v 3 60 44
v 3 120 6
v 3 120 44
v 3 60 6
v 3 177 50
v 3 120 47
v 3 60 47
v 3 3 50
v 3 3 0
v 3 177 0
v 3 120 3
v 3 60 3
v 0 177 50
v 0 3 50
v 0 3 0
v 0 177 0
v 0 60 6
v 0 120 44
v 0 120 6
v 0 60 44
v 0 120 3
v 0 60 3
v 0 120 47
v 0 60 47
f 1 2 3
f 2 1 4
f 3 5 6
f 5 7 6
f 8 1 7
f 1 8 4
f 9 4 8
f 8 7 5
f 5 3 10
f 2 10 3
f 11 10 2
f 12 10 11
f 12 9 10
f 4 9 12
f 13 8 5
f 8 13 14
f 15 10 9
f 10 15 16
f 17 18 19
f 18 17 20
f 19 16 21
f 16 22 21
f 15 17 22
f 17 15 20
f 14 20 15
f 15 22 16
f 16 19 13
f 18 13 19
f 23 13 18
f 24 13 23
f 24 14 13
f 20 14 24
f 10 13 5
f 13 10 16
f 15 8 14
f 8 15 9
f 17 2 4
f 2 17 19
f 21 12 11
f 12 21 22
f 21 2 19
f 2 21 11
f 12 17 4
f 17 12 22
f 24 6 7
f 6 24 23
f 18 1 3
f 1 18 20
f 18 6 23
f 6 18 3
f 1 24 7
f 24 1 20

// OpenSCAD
// file: config.scad
// All measures in millimeters

$fn = 200;
material_z = 3;
nothing = 0.01;

box_x = 180;
box_y = box_x;
box_z = 50;

top_inset_z = 3;
bottom_inset_z = 3;

nose_width = box_x / 3;
nose_offset_x = box_x/2 - nose_width/2;
nose_offset_y = nose_offset_x;

/*
 * Pintsch Bamag KNRW-220-G measures
 */
lamp_diameter = 165;
// [hole_x, hole_y hole_diameter]
lamp_holes = [
    // The big one
    [112.352, 93.705, 19],
    // The inner screw holes in counterclockwise order
    [82.735, 141.303, 6],
    [25.113, 51.206, 6],
    [131.988, 46.073, 6],
    // The outer screw holes in counterclockwise order
    [66.192, 142.490, 6],
    [32.613, 36.141, 6],
    [141.364, 59.746, 6]
    ];

lamp_offset_x = (box_x - lamp_diameter)/2;
lamp_offset_y = (box_y - lamp_diameter)/2;
// main file
include <config.scad>;

module side_y()
{
    difference()
    {
        // Plate
        translate([0, material_z, 0])
        cube([
            material_z,
            box_y - 2*material_z,
            box_z
            ]);

        // Bottom edge nose cutout
        translate([
            -nothing,
            nose_offset_y,
            bottom_inset_z
            ])
        cube([
            material_z + 2*nothing,
            nose_width,
            material_z
            ]);

        // Top edge nose cutout
        translate([
            -nothing,
            nose_offset_y,
            box_z - top_inset_z - material_z
            ])
        cube([
            material_z + 2*nothing,
            nose_width,
            material_z
            ]);
    }
}

side_y();
